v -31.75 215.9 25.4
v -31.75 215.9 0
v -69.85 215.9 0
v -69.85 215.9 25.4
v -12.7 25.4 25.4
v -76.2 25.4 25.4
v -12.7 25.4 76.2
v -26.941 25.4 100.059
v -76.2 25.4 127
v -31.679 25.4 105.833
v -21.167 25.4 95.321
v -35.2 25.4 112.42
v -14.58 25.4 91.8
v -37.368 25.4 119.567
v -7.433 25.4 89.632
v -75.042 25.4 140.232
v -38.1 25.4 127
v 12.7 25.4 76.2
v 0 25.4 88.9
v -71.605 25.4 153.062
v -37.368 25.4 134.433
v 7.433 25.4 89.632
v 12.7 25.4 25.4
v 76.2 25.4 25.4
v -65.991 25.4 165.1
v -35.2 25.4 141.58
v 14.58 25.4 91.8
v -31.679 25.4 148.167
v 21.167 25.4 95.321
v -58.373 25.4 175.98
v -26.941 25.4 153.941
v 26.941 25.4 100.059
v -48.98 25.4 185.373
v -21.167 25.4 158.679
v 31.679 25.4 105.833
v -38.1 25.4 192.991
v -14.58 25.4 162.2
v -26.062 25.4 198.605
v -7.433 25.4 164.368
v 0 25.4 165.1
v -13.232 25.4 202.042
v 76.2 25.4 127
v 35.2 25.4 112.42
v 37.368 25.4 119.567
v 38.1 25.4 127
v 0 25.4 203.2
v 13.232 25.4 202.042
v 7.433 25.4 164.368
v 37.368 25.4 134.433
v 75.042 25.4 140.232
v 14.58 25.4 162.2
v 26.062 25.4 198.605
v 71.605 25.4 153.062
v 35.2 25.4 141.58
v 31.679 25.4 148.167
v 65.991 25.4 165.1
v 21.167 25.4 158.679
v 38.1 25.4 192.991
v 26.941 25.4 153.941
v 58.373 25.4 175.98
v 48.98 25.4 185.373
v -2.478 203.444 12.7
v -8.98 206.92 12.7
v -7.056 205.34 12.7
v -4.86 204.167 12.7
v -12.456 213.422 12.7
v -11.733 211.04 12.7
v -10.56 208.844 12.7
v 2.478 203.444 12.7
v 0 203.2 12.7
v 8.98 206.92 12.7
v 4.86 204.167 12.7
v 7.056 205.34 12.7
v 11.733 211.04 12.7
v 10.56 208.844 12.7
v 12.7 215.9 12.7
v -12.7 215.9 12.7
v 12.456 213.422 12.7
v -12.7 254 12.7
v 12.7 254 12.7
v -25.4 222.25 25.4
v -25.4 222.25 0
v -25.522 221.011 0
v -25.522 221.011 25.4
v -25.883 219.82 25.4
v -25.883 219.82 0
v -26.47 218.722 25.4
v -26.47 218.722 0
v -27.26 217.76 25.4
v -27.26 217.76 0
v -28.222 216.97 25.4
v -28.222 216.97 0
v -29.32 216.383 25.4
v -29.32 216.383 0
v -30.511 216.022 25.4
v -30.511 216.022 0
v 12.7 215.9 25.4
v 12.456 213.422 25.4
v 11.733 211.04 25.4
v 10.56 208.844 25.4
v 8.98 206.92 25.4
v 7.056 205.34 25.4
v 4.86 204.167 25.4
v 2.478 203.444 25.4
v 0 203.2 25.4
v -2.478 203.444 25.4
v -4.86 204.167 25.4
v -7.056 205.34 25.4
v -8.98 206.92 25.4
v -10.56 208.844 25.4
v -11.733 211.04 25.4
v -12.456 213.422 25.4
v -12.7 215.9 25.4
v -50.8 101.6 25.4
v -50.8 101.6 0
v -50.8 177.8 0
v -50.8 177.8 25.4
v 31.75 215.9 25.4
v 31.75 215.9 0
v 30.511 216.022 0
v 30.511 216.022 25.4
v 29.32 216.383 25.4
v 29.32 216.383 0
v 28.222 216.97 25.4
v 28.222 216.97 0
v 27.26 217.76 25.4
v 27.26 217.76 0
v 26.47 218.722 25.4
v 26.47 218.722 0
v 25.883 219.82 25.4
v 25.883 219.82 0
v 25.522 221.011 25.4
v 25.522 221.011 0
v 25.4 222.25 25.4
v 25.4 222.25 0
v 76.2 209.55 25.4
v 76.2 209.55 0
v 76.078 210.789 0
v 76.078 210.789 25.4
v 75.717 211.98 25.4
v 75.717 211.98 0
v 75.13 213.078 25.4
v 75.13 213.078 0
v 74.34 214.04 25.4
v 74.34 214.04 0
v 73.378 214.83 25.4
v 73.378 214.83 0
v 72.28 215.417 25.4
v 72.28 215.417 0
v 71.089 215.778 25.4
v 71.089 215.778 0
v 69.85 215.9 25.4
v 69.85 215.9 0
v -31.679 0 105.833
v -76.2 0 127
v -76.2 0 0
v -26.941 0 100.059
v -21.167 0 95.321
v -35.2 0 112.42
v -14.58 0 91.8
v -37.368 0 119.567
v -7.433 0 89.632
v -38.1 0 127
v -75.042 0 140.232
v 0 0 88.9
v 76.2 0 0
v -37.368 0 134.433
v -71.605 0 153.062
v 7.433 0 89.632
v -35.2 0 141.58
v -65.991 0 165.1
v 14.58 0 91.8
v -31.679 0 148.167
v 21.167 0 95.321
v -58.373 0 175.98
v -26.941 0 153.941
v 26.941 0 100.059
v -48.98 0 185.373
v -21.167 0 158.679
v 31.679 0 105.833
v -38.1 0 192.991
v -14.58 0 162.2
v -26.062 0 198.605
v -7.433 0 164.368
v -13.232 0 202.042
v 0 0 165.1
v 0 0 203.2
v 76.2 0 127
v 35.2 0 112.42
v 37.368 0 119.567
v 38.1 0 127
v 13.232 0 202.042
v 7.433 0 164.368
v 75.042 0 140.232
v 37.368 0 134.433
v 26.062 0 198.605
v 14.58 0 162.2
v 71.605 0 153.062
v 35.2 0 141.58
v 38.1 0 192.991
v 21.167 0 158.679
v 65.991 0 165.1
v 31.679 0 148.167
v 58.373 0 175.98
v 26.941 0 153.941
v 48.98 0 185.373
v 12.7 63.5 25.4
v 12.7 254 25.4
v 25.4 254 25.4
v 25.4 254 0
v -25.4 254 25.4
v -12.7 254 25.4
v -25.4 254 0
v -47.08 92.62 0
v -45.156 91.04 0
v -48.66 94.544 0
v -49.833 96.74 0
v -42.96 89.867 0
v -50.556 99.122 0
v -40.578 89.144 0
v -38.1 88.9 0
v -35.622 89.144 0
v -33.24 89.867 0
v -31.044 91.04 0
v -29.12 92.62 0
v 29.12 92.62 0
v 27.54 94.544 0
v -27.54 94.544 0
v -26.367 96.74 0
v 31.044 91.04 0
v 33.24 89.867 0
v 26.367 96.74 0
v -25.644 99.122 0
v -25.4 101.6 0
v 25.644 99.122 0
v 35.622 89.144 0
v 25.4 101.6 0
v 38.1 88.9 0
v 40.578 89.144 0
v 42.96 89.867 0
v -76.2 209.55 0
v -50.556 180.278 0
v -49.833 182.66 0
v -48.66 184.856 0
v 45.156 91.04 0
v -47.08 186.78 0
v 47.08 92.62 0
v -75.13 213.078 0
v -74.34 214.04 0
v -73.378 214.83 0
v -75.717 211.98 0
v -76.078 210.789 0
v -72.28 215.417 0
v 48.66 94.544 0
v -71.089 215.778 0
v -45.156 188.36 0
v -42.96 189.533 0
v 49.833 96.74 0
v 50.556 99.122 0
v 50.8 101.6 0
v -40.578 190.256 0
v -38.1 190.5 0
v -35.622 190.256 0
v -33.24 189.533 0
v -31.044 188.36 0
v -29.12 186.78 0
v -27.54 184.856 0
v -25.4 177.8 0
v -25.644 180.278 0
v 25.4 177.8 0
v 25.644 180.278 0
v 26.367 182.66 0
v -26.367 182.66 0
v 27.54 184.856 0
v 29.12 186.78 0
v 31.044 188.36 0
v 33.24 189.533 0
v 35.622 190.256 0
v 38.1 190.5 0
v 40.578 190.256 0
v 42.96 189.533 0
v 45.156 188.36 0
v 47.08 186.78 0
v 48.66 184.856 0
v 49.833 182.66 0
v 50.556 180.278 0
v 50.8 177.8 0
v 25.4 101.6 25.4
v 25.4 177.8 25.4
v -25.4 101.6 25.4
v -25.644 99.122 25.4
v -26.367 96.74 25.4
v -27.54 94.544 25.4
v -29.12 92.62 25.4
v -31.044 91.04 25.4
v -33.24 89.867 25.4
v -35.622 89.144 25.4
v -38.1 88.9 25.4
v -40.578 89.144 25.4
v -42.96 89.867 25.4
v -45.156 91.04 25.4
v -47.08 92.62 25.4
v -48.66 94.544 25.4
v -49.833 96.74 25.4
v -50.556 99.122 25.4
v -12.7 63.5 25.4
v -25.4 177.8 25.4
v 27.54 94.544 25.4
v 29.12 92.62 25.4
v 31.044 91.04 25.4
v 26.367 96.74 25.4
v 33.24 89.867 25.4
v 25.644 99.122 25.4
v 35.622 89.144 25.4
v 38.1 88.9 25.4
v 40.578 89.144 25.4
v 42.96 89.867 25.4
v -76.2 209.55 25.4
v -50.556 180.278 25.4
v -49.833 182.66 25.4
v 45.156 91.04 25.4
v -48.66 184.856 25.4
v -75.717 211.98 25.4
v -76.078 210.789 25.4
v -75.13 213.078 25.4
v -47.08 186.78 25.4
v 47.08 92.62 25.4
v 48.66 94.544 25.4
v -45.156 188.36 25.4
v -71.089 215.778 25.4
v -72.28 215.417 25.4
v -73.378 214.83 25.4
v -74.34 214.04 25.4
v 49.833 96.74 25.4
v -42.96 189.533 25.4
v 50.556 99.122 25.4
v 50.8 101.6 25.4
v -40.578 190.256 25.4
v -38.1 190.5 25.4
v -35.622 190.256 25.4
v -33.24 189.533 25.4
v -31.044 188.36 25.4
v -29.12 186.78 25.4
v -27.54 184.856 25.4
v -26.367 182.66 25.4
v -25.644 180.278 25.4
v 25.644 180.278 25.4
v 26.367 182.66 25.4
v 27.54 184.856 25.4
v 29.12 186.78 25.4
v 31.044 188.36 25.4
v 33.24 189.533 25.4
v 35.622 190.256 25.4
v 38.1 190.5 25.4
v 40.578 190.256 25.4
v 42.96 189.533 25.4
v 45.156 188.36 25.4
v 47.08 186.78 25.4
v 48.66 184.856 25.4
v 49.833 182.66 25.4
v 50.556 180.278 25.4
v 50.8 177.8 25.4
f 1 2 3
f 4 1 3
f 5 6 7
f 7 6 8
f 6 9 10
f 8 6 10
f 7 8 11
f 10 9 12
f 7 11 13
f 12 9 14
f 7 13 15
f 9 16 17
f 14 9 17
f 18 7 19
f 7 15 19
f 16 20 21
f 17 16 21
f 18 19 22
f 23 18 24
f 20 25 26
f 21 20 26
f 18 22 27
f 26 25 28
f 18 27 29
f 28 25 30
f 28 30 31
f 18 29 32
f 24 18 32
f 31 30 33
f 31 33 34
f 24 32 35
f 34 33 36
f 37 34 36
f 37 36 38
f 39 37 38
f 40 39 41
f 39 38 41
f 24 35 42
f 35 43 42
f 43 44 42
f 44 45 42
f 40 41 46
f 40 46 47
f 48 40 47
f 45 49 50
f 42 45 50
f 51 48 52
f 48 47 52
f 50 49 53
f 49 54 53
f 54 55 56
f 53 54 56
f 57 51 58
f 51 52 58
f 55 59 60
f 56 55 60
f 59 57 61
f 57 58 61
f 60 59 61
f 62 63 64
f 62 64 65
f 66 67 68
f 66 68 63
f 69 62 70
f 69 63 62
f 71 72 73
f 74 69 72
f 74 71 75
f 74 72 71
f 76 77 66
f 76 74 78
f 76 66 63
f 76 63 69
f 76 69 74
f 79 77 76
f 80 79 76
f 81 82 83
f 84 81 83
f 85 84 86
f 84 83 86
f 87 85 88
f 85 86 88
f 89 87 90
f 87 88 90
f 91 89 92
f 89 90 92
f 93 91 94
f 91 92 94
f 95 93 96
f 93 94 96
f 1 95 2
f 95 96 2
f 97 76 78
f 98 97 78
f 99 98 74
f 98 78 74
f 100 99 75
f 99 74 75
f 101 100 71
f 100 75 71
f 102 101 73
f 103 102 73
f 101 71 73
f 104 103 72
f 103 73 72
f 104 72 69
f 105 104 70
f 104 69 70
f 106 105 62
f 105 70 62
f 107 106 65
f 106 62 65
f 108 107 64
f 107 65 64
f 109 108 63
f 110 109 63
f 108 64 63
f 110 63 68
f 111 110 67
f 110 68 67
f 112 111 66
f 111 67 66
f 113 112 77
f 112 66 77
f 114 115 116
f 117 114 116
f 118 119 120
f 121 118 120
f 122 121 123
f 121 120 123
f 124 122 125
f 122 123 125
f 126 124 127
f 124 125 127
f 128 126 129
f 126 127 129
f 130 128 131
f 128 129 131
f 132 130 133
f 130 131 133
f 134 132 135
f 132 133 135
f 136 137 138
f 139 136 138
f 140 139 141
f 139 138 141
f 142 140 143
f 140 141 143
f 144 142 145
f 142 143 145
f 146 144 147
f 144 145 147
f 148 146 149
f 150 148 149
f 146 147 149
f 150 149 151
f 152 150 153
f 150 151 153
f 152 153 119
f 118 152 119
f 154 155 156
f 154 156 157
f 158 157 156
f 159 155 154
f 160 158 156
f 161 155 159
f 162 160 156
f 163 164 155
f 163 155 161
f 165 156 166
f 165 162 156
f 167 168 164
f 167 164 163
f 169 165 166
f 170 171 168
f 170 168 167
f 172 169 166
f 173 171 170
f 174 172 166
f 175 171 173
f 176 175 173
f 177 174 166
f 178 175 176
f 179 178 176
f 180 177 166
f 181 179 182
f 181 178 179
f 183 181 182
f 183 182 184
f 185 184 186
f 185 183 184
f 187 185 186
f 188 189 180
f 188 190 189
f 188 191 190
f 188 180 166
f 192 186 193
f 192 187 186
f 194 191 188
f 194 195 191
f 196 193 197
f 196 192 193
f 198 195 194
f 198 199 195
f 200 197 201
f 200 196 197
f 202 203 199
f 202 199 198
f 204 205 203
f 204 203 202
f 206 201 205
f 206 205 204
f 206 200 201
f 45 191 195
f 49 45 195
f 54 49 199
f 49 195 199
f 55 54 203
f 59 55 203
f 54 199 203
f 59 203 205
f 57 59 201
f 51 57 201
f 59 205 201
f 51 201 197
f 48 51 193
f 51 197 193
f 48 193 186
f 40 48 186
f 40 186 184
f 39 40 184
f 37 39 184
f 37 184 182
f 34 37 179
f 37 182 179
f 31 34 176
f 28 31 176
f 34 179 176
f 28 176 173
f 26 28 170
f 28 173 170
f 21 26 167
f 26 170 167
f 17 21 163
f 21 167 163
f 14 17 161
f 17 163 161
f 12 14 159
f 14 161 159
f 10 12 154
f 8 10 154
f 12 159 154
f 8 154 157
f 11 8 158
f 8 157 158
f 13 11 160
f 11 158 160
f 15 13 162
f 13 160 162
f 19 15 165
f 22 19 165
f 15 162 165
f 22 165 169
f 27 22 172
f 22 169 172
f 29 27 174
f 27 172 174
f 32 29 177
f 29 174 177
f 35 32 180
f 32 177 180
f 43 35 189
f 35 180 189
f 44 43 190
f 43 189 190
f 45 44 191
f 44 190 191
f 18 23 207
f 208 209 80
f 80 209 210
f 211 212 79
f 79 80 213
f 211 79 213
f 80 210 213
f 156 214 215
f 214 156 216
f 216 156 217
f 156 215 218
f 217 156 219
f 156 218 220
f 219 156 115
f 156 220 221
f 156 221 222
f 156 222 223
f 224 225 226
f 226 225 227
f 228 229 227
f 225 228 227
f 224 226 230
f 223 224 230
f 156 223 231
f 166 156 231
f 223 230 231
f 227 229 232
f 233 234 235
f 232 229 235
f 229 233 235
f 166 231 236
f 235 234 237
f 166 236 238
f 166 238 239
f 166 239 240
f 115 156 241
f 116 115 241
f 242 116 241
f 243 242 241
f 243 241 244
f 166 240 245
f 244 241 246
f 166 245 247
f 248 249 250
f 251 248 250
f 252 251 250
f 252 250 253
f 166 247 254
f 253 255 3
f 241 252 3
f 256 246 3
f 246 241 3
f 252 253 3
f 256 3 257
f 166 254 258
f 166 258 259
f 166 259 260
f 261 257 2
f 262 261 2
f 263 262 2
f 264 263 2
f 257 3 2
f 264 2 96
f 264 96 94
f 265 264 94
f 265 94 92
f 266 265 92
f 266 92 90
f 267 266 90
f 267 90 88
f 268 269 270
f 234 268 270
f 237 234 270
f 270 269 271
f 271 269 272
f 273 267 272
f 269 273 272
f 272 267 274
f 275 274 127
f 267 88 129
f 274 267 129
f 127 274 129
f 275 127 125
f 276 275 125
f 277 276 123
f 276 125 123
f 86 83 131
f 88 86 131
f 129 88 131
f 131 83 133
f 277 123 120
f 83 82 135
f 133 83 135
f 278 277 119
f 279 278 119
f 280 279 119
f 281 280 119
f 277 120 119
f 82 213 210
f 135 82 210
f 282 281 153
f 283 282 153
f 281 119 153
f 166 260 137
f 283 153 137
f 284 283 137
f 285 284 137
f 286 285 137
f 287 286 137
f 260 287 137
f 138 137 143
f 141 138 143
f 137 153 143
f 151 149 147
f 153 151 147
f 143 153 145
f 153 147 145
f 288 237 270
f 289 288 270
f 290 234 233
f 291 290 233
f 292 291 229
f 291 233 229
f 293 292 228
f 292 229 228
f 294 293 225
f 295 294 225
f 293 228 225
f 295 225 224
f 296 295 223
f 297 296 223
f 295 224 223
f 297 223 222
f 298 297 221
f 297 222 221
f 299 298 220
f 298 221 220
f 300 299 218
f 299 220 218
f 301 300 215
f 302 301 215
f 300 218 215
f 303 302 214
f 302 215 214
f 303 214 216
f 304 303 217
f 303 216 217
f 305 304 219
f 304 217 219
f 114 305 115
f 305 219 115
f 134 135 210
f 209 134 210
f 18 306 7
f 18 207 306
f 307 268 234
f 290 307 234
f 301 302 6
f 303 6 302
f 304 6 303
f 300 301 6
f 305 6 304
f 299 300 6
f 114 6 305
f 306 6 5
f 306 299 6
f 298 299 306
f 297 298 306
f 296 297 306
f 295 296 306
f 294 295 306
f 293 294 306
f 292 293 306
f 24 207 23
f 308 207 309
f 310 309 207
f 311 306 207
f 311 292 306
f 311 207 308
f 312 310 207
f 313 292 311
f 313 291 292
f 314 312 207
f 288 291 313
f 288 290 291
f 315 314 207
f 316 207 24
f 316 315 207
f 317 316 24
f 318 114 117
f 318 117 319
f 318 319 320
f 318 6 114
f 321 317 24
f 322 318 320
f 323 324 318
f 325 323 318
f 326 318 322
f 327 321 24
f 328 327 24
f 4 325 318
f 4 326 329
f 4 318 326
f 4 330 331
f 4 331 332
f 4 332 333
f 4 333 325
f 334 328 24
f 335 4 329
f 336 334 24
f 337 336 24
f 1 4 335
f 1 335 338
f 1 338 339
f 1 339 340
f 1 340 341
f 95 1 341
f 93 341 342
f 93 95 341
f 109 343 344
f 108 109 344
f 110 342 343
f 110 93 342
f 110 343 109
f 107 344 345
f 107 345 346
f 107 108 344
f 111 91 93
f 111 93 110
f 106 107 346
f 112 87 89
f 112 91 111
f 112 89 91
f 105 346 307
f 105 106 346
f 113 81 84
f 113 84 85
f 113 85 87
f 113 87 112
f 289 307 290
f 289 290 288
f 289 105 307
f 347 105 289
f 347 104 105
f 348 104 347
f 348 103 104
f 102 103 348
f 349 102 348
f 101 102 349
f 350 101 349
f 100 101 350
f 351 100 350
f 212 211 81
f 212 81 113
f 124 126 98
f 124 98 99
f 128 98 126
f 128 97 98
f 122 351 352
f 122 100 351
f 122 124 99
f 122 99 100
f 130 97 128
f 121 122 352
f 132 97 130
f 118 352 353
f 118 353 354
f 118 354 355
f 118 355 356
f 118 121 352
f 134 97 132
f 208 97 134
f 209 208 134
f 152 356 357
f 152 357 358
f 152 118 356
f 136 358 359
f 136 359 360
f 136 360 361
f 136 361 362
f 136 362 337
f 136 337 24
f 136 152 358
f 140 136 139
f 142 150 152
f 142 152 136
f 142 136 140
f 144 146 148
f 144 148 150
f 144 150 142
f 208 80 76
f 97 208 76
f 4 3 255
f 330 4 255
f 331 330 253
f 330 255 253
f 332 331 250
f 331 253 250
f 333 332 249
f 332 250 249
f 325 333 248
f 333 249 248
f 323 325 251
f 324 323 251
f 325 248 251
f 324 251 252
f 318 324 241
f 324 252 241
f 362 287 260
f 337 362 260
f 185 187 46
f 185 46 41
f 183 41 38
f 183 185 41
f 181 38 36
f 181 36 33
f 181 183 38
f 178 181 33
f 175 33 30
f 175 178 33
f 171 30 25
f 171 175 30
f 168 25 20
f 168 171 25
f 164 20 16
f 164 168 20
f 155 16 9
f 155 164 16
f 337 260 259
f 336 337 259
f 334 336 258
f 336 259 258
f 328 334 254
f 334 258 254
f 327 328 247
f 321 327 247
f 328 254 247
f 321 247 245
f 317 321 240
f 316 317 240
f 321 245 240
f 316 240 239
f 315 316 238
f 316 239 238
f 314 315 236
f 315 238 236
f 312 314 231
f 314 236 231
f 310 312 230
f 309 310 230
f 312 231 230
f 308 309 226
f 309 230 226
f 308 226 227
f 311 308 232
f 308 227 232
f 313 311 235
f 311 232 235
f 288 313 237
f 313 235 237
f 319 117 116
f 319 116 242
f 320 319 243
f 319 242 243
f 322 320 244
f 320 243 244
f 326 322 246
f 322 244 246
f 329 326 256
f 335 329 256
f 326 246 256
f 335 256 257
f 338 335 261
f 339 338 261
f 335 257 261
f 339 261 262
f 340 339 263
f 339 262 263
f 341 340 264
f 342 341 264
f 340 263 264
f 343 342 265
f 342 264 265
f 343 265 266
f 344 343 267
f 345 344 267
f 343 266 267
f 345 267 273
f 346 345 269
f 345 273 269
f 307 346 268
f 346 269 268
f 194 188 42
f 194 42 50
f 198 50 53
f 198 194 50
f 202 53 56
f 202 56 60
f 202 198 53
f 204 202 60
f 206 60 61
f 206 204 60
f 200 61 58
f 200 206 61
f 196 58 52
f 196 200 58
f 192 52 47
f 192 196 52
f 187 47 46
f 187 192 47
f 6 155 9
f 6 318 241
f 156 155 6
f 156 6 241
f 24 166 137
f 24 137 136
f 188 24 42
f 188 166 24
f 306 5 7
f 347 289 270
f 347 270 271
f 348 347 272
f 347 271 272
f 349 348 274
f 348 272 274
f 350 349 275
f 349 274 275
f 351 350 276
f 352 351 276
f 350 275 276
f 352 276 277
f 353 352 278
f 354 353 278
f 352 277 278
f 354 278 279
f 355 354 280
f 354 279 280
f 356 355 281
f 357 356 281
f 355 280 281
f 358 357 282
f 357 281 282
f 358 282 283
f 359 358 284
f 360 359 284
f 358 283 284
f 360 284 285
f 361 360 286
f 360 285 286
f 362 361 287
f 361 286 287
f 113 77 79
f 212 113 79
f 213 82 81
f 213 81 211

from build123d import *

# Parameters (mm, degrees)
F1_DEPTH = 25.4
F0_W     = 12.7
F0_H     = 31.75
F2_DEPTH = 25.4
F4_DEPTH = 12.7
F6_R     = 38.1
F7_DEPTH = 25.4
F8_DEPTH = 12.7


# Not quite as in the source:
# - a feature names something its author has since deleted; it is built from what else it names


with BuildPart() as f1:
    # F0 (on Top) → F1 (new body)
    with BuildSketch(Plane.XY):
        with BuildLine():
            Line((-76.2, 209.55), (-76.2, 0))
            Line((-76.2, 0), (76.2, 0))
            Line((76.2, 0), (76.2, 209.55))
            ThreePointArc((76.2, 209.55), (74.3401280605, 214.0401280605), (69.85, 215.9))
            Line((69.85, 215.9), (31.75, 215.9))
            ThreePointArc((31.75, 215.9), (27.2598719395, 217.7598719395), (25.4, 222.25))
            Line((25.4, 222.25), (12.7, 222.25))
            Line((12.7, 222.25), (12.7, 215.9))
            ThreePointArc((12.7, 215.9), (0, 203.2), (-12.7, 215.9))
            Line((-12.7, 215.9), (-12.7, 222.25))
            Line((-12.7, 222.25), (-25.4, 222.25))
            ThreePointArc((-25.4, 222.25), (-27.2598719395, 217.7598719395), (-31.75, 215.9))
            Line((-31.75, 215.9), (-69.85, 215.9))
            ThreePointArc((-69.85, 215.9), (-74.3401280605, 214.0401280605), (-76.2, 209.55))
        make_face()
        with BuildLine():
            Line((-50.8, 101.6), (-50.8, 177.8))
            ThreePointArc((-50.8, 177.8), (-38.1, 190.5), (-25.4, 177.8))
            Line((-25.4, 177.8), (-25.4, 101.6))
            ThreePointArc((-25.4, 101.6), (-38.1, 88.9), (-50.8, 101.6))
        make_face(mode=Mode.SUBTRACT)
        with BuildLine():
            Line((25.4, 101.6), (25.4, 177.8))
            ThreePointArc((25.4, 177.8), (38.1, 190.5), (50.8, 177.8))
            Line((50.8, 177.8), (50.8, 101.6))
            ThreePointArc((50.8, 101.6), (38.1, 88.9), (25.4, 101.6))
        make_face(mode=Mode.SUBTRACT)
    extrude(amount=F1_DEPTH)

    # F0 (on Top) → F2 (join)
    with BuildSketch(Plane.XY):
        with Locations((-19.05, 238.125)):
            Rectangle(F0_W, F0_H)
        with Locations((19.05, 238.125)):
            Rectangle(F0_W, F0_H)
    extrude(amount=F2_DEPTH)

    # F3 (on Right) → F4 (join, symmetric)
    with BuildSketch(Plane.YZ):
        Polygon((25.4, 76.2), (25.4, 25.4), (63.5, 25.4), align=None)
    extrude(amount=F4_DEPTH, both=True)

    # F6 (on Front) → F7 (join)
    with BuildSketch(Plane.XZ):
        with BuildLine():
            Line((-76.2, 25.4), (76.2, 25.4))
            Line((76.2, 25.4), (76.2, 127))
            ThreePointArc((76.2, 127), (53.8815367264, 180.8815367264), (0, 203.2))
            ThreePointArc((0, 203.2), (-53.8815367264, 180.8815367264), (-76.2, 127))
            Line((-76.2, 127), (-76.2, 25.4))
        make_face()
        with Locations((0, 127)):
            Circle(F6_R, mode=Mode.SUBTRACT)
    extrude(amount=-F7_DEPTH)

    # F0 (on Top) → F8 (join)
    with BuildSketch(Plane.XY):
        with BuildLine():
            Line((-12.7, 254), (-12.7, 222.25))
            Line((-12.7, 222.25), (-12.7, 215.9))
            ThreePointArc((-12.7, 215.9), (0, 203.2), (12.7, 215.9))
            Line((12.7, 215.9), (12.7, 222.25))
            Line((12.7, 222.25), (12.7, 254))
            Line((12.7, 254), (-12.7, 254))
        make_face()
    extrude(amount=F8_DEPTH)


solid = f1.part
